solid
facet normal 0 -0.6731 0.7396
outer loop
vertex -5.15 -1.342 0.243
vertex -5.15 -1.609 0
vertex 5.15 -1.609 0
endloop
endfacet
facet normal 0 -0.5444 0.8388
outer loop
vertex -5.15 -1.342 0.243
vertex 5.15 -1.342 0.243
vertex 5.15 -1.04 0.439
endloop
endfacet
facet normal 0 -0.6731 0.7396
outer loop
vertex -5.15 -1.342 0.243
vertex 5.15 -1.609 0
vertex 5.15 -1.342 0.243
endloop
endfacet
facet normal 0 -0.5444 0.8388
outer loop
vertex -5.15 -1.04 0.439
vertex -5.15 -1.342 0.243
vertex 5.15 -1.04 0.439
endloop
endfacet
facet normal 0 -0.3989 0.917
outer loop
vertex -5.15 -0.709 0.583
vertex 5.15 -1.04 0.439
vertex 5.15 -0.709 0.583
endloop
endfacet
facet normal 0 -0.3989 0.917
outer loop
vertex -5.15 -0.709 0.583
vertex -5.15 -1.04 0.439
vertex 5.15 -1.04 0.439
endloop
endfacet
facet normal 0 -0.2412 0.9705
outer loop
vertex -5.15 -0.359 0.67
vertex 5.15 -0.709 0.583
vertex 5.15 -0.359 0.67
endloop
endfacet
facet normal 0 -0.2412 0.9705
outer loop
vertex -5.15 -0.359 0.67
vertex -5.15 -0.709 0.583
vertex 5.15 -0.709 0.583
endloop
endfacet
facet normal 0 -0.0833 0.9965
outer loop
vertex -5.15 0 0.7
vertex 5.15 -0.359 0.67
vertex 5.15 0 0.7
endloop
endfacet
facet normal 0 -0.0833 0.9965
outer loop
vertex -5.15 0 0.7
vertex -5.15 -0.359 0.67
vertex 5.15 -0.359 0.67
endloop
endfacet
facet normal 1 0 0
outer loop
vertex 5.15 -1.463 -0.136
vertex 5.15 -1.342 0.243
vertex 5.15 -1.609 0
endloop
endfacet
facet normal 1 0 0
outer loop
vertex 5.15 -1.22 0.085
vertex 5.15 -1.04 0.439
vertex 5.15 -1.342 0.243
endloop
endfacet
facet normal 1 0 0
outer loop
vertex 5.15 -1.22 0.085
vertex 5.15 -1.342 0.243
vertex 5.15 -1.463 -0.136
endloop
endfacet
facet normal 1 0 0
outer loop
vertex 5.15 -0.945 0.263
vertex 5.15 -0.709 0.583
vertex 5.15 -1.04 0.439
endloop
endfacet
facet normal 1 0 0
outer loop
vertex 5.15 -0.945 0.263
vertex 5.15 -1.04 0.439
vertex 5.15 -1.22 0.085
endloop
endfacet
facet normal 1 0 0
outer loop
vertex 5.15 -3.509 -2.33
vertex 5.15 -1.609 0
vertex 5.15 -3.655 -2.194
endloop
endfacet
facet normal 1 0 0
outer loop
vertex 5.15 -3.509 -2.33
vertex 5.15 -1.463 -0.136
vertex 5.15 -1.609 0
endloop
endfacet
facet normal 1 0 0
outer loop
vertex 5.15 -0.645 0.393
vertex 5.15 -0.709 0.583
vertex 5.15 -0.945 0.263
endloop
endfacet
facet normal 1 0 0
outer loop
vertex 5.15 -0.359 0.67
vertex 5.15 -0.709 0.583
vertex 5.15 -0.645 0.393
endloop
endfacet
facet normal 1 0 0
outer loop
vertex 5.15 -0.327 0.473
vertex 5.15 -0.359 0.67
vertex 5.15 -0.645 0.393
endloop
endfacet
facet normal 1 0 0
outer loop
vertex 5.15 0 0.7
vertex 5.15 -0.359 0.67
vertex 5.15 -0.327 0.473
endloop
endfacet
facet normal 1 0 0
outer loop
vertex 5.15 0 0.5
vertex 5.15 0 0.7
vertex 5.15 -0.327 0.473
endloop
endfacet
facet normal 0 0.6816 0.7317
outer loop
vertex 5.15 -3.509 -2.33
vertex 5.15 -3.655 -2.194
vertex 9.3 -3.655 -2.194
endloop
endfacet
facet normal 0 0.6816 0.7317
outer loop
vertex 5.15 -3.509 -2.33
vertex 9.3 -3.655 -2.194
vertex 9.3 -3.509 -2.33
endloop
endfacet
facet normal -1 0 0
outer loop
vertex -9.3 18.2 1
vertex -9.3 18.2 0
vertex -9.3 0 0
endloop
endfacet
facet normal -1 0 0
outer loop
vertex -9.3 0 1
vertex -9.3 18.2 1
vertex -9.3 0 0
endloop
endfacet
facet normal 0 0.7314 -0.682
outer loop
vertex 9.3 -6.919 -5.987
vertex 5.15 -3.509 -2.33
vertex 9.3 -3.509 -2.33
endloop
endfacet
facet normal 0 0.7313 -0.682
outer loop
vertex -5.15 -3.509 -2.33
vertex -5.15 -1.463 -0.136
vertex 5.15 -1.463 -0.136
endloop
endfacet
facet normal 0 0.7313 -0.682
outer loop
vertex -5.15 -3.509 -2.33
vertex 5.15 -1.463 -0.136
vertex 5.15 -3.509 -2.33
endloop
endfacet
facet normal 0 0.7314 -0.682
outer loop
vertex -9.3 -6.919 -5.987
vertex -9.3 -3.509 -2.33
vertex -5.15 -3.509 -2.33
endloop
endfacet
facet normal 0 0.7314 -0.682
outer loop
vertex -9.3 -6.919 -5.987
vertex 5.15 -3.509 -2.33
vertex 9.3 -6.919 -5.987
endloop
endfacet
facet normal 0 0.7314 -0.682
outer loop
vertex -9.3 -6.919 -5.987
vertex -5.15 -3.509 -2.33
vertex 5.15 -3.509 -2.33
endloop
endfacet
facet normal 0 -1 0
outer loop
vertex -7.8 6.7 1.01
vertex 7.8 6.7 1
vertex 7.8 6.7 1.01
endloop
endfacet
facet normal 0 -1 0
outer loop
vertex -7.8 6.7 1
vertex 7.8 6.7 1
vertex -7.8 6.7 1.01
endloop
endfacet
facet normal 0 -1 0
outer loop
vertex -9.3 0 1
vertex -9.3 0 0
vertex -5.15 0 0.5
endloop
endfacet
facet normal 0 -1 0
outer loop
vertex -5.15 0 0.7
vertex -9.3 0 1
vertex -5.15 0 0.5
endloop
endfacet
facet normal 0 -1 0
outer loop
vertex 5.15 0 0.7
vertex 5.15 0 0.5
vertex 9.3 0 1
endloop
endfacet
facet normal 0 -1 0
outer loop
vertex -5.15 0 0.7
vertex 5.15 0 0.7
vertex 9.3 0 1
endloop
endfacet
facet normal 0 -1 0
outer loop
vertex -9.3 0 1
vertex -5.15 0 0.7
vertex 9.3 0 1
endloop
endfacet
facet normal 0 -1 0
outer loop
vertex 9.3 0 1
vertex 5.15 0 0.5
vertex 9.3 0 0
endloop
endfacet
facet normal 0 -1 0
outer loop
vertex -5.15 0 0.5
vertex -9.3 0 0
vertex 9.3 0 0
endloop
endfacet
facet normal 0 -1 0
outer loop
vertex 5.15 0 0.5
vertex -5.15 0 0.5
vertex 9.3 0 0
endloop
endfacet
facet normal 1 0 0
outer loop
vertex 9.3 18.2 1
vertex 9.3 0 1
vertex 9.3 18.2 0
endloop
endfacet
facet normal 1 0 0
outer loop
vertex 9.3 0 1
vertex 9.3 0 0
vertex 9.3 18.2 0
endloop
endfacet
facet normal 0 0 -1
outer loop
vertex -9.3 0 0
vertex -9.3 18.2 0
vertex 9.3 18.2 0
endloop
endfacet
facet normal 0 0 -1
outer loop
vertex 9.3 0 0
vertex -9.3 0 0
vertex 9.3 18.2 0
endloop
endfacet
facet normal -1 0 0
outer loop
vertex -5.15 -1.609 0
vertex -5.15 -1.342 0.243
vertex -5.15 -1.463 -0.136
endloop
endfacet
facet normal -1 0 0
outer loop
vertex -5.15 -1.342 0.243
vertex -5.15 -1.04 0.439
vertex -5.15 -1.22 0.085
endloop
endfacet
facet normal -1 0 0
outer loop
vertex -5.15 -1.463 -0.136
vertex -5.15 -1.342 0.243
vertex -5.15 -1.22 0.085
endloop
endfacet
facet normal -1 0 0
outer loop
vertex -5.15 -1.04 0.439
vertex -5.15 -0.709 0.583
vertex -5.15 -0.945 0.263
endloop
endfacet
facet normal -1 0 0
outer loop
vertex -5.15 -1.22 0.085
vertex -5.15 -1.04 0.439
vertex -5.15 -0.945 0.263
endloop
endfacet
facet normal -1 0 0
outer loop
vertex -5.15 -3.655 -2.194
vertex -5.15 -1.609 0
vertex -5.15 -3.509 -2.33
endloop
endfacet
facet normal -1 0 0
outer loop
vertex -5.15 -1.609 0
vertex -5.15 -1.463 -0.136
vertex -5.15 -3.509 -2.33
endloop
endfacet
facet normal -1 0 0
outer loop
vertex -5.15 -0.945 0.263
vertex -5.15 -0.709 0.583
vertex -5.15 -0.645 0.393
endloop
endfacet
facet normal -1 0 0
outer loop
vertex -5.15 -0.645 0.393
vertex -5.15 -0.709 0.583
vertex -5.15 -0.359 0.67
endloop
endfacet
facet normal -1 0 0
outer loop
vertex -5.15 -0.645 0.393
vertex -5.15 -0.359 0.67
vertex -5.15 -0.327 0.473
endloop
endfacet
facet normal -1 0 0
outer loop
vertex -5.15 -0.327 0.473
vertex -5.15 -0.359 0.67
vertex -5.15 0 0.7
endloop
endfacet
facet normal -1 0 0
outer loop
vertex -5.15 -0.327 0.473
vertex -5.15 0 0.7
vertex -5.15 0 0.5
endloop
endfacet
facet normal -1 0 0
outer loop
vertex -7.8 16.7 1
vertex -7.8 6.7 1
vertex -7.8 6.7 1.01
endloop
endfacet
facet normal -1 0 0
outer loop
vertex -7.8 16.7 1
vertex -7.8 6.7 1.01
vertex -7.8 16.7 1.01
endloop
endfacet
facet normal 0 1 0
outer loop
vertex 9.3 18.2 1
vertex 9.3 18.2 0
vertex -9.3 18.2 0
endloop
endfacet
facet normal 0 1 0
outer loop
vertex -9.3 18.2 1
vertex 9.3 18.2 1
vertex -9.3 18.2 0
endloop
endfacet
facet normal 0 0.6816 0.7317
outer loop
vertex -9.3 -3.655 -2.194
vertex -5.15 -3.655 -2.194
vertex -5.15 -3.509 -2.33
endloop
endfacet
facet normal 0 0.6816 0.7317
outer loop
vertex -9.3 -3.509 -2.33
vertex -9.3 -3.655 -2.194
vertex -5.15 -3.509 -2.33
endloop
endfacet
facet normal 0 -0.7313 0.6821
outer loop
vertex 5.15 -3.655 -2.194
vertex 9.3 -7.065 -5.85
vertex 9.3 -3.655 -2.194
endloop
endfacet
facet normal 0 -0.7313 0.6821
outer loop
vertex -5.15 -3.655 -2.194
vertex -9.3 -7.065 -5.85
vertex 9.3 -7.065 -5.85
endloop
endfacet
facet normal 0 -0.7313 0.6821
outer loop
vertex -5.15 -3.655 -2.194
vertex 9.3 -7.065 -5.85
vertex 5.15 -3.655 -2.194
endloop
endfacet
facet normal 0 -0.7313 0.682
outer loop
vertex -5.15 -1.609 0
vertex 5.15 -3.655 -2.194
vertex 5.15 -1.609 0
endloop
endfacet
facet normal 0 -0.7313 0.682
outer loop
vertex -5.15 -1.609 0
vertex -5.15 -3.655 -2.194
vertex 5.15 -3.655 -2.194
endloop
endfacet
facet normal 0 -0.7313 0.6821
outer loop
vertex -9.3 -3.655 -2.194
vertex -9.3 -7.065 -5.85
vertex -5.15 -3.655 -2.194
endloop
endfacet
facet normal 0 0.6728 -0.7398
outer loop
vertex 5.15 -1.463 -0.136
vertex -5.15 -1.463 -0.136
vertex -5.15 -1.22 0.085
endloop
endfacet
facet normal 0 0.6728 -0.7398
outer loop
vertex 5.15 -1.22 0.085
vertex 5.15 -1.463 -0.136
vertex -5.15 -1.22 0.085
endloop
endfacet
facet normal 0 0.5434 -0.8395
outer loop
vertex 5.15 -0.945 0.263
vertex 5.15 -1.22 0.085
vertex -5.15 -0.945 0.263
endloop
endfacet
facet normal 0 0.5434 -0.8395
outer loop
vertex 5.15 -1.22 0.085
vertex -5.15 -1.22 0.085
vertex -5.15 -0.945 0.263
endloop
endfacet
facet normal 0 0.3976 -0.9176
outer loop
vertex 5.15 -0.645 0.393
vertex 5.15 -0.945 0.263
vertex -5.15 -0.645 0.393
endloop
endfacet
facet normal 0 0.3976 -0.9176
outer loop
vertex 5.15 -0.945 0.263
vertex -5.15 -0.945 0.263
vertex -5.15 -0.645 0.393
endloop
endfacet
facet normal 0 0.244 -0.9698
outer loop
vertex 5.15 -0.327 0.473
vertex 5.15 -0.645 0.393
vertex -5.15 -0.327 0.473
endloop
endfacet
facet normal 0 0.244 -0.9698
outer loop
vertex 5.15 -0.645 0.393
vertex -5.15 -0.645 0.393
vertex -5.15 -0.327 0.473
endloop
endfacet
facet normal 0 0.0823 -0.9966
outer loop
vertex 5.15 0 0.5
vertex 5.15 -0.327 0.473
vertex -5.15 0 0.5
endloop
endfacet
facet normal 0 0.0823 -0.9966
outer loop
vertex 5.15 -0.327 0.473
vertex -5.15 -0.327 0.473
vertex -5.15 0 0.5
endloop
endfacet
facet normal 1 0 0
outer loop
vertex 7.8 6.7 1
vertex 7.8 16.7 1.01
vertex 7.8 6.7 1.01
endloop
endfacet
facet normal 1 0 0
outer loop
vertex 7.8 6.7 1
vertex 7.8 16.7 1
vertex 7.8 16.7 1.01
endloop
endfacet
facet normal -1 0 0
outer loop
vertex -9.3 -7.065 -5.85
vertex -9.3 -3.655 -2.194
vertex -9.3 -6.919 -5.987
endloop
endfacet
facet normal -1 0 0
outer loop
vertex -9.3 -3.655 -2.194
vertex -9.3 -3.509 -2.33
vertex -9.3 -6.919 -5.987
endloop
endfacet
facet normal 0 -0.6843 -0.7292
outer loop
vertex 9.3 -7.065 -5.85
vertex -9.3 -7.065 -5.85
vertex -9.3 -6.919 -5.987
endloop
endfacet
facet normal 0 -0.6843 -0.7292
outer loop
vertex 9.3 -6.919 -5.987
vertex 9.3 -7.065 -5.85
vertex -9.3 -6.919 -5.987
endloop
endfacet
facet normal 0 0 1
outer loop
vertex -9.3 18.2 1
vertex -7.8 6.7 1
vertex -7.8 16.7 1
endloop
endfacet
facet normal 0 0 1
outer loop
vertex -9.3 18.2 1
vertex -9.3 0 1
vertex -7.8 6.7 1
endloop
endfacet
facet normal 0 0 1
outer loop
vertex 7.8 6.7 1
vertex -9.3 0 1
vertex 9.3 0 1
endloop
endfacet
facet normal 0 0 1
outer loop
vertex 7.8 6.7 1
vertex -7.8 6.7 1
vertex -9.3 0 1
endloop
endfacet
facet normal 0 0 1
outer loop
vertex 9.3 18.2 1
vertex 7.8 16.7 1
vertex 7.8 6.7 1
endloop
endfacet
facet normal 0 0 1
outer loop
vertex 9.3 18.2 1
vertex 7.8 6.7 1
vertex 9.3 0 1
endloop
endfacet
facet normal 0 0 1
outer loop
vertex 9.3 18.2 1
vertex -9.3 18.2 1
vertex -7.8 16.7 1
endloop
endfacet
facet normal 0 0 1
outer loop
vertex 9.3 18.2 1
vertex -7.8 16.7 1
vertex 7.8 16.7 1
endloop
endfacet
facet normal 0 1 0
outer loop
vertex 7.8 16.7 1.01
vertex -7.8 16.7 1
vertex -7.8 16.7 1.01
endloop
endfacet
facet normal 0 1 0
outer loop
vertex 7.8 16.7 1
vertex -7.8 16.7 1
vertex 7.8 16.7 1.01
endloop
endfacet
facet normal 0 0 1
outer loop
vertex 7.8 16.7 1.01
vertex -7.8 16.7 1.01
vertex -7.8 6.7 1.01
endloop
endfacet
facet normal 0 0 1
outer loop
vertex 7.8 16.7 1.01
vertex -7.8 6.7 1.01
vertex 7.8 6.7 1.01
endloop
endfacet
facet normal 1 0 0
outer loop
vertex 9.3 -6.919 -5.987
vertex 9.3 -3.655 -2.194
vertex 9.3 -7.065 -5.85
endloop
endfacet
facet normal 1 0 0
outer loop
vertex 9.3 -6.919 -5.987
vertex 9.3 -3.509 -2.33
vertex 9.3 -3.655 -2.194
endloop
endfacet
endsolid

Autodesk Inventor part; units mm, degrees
ref_plane "YZ Plane" through (0, 0, 0) normal (1, 0, 0) x (0, 1, 0)
sketch "Sketch2" plane through (0, 0, 0) normal (0, 0, 1) x (1, 0, 0)
  line L0 (-9.3, 0) -> (9.3, 0)
  line L1 (9.3, 0) -> (9.3, 18.2)
  line L2 (9.3, 18.2) -> (-9.3, 18.2)
  line L3 (-9.3, 18.2) -> (-9.3, 0)
  point P0 (0, 0)
  point P1 (0, 0)
  dimension "d0" = 18.6
  dimension "d1" = 18.2
extrude "Extrusion1" add sketch "Sketch2" along normal blind 1
ref_plane "Work Plane1" through (0, 0, 0.25) normal (0, 0, -1) x (-1, 0, 0)
sketch "Sketch5" plane through (0, 0, 0) normal (0, 0, -1) x (-1, 0, 0)
  line L0 (-7.8, 6.7) -> (7.8, 6.7)
  line L1 (7.8, 6.7) -> (7.8, 16.7)
  line L2 (7.8, 16.7) -> (-7.8, 16.7)
  line L3 (-7.8, 16.7) -> (-7.8, 6.7)
  line L4 (9.3, 18.2) -> (9.3, 0) projected
  line L5 (9.3, 0) -> (-9.3, 0) projected
  line L6 (-9.3, 18.2) -> (9.3, 18.2) projected
  point P0 (0, 0)
  point P1 (0, 6.7)
  point P2 (0, 0)
  dimension "d13" = 10
  dimension "d15" = 1.5
  dimension "d16" = 1.5
ref_plane "Work Plane2" through (0, 0, 0) normal (1, 0, 0) x (0, 0, -1)
sketch "Sketch7" plane through (0, 0, 0) normal (1, 0, 0) x (0, 0, -1)
  arc A0 (-0.5, 0) -> (0.136, -1.4627) centre (1.5, 0) ccw
  line L0 (0, 0) -> (-1, 0) projected
  line L1 (0.136, -1.4627) -> (5.9868, -6.9187)
  line L2 (0, 18.2) -> (0, 0) projected
  line L3 (5.8504, -7.065) -> (-0.0004, -1.609)
  arc A1 (-0.7, 0) -> (-0.0004, -1.609) centre (1.5, 0) ccw
  line L4 (5.8504, -7.065) -> (5.9868, -6.9187)
  point P0 (5.9186, -6.9918)
  dimension "d19" = 2
  dimension "d22" = 43
  dimension "d23" = 0.5
  dimension "d24" = 0.2
  dimension "d33" = 8
extrude "Extrusion4" add sketch "Sketch7" along normal mid plane 10.3
sketch "Sketch8" plane through (0, 0, 0) normal (1, 0, 0) x (0, 0, -1)
  arc A0 (-0.5, 0) -> (0.136, -1.4627) centre (1.5, 0) ccw projected
  line L0 (-0.7, 0) -> (-0.5, 0) projected
  arc A1 (-0.7, 0) -> (-0.0004, -1.609) centre (1.5, 0) ccw construction
  line L1 (-0.0004, -1.609) -> (5.8504, -7.065) projected
  line L2 (5.8504, -7.065) -> (5.9868, -6.9187) projected
  line L3 (5.9868, -6.9187) -> (0.136, -1.4627) projected
  line L4 (2.1937, -3.655) -> (2.3301, -3.5087)
  point P0 (0, 0)
  dimension "d28" = 5
extrude "Extrusion5" add sketch "Sketch8" along normal mid plane 18.6
sketch "Sketch9" plane through (0, 0, 1) normal (0, 0, 1) x (1, 0, 0)
  line L0 (7.8, 16.7) -> (7.8, 6.7) projected
  line L1 (7.8, 6.7) -> (-7.8, 6.7) projected
  line L2 (-7.8, 6.7) -> (-7.8, 16.7) projected
  line L3 (-7.8, 16.7) -> (7.8, 16.7) projected
  point P0 (0, 0)
extrude "Extrusion6" add sketch "Sketch9" along normal blind 0.01
equation "\"BendRadius\" = Thickness"
equation "\"BendReliefWidth\" = Thickness"
equation "\"BendReliefDepth\" = 0.5 * Thickness"
equation "\"CornerReliefSize\" = 4 * Thickness"
equation "\"MinimumRemnant\" = 2 * Thickness"
equation "\"TransitionRadius\" = BendRadius"
equation "\"JacobiRadiusSize\" = BendRadius"
equation "\"GapSize\" = Thickness"
equation "\"Thickness\" = 0.2"
properties part number "0_42_oled"
